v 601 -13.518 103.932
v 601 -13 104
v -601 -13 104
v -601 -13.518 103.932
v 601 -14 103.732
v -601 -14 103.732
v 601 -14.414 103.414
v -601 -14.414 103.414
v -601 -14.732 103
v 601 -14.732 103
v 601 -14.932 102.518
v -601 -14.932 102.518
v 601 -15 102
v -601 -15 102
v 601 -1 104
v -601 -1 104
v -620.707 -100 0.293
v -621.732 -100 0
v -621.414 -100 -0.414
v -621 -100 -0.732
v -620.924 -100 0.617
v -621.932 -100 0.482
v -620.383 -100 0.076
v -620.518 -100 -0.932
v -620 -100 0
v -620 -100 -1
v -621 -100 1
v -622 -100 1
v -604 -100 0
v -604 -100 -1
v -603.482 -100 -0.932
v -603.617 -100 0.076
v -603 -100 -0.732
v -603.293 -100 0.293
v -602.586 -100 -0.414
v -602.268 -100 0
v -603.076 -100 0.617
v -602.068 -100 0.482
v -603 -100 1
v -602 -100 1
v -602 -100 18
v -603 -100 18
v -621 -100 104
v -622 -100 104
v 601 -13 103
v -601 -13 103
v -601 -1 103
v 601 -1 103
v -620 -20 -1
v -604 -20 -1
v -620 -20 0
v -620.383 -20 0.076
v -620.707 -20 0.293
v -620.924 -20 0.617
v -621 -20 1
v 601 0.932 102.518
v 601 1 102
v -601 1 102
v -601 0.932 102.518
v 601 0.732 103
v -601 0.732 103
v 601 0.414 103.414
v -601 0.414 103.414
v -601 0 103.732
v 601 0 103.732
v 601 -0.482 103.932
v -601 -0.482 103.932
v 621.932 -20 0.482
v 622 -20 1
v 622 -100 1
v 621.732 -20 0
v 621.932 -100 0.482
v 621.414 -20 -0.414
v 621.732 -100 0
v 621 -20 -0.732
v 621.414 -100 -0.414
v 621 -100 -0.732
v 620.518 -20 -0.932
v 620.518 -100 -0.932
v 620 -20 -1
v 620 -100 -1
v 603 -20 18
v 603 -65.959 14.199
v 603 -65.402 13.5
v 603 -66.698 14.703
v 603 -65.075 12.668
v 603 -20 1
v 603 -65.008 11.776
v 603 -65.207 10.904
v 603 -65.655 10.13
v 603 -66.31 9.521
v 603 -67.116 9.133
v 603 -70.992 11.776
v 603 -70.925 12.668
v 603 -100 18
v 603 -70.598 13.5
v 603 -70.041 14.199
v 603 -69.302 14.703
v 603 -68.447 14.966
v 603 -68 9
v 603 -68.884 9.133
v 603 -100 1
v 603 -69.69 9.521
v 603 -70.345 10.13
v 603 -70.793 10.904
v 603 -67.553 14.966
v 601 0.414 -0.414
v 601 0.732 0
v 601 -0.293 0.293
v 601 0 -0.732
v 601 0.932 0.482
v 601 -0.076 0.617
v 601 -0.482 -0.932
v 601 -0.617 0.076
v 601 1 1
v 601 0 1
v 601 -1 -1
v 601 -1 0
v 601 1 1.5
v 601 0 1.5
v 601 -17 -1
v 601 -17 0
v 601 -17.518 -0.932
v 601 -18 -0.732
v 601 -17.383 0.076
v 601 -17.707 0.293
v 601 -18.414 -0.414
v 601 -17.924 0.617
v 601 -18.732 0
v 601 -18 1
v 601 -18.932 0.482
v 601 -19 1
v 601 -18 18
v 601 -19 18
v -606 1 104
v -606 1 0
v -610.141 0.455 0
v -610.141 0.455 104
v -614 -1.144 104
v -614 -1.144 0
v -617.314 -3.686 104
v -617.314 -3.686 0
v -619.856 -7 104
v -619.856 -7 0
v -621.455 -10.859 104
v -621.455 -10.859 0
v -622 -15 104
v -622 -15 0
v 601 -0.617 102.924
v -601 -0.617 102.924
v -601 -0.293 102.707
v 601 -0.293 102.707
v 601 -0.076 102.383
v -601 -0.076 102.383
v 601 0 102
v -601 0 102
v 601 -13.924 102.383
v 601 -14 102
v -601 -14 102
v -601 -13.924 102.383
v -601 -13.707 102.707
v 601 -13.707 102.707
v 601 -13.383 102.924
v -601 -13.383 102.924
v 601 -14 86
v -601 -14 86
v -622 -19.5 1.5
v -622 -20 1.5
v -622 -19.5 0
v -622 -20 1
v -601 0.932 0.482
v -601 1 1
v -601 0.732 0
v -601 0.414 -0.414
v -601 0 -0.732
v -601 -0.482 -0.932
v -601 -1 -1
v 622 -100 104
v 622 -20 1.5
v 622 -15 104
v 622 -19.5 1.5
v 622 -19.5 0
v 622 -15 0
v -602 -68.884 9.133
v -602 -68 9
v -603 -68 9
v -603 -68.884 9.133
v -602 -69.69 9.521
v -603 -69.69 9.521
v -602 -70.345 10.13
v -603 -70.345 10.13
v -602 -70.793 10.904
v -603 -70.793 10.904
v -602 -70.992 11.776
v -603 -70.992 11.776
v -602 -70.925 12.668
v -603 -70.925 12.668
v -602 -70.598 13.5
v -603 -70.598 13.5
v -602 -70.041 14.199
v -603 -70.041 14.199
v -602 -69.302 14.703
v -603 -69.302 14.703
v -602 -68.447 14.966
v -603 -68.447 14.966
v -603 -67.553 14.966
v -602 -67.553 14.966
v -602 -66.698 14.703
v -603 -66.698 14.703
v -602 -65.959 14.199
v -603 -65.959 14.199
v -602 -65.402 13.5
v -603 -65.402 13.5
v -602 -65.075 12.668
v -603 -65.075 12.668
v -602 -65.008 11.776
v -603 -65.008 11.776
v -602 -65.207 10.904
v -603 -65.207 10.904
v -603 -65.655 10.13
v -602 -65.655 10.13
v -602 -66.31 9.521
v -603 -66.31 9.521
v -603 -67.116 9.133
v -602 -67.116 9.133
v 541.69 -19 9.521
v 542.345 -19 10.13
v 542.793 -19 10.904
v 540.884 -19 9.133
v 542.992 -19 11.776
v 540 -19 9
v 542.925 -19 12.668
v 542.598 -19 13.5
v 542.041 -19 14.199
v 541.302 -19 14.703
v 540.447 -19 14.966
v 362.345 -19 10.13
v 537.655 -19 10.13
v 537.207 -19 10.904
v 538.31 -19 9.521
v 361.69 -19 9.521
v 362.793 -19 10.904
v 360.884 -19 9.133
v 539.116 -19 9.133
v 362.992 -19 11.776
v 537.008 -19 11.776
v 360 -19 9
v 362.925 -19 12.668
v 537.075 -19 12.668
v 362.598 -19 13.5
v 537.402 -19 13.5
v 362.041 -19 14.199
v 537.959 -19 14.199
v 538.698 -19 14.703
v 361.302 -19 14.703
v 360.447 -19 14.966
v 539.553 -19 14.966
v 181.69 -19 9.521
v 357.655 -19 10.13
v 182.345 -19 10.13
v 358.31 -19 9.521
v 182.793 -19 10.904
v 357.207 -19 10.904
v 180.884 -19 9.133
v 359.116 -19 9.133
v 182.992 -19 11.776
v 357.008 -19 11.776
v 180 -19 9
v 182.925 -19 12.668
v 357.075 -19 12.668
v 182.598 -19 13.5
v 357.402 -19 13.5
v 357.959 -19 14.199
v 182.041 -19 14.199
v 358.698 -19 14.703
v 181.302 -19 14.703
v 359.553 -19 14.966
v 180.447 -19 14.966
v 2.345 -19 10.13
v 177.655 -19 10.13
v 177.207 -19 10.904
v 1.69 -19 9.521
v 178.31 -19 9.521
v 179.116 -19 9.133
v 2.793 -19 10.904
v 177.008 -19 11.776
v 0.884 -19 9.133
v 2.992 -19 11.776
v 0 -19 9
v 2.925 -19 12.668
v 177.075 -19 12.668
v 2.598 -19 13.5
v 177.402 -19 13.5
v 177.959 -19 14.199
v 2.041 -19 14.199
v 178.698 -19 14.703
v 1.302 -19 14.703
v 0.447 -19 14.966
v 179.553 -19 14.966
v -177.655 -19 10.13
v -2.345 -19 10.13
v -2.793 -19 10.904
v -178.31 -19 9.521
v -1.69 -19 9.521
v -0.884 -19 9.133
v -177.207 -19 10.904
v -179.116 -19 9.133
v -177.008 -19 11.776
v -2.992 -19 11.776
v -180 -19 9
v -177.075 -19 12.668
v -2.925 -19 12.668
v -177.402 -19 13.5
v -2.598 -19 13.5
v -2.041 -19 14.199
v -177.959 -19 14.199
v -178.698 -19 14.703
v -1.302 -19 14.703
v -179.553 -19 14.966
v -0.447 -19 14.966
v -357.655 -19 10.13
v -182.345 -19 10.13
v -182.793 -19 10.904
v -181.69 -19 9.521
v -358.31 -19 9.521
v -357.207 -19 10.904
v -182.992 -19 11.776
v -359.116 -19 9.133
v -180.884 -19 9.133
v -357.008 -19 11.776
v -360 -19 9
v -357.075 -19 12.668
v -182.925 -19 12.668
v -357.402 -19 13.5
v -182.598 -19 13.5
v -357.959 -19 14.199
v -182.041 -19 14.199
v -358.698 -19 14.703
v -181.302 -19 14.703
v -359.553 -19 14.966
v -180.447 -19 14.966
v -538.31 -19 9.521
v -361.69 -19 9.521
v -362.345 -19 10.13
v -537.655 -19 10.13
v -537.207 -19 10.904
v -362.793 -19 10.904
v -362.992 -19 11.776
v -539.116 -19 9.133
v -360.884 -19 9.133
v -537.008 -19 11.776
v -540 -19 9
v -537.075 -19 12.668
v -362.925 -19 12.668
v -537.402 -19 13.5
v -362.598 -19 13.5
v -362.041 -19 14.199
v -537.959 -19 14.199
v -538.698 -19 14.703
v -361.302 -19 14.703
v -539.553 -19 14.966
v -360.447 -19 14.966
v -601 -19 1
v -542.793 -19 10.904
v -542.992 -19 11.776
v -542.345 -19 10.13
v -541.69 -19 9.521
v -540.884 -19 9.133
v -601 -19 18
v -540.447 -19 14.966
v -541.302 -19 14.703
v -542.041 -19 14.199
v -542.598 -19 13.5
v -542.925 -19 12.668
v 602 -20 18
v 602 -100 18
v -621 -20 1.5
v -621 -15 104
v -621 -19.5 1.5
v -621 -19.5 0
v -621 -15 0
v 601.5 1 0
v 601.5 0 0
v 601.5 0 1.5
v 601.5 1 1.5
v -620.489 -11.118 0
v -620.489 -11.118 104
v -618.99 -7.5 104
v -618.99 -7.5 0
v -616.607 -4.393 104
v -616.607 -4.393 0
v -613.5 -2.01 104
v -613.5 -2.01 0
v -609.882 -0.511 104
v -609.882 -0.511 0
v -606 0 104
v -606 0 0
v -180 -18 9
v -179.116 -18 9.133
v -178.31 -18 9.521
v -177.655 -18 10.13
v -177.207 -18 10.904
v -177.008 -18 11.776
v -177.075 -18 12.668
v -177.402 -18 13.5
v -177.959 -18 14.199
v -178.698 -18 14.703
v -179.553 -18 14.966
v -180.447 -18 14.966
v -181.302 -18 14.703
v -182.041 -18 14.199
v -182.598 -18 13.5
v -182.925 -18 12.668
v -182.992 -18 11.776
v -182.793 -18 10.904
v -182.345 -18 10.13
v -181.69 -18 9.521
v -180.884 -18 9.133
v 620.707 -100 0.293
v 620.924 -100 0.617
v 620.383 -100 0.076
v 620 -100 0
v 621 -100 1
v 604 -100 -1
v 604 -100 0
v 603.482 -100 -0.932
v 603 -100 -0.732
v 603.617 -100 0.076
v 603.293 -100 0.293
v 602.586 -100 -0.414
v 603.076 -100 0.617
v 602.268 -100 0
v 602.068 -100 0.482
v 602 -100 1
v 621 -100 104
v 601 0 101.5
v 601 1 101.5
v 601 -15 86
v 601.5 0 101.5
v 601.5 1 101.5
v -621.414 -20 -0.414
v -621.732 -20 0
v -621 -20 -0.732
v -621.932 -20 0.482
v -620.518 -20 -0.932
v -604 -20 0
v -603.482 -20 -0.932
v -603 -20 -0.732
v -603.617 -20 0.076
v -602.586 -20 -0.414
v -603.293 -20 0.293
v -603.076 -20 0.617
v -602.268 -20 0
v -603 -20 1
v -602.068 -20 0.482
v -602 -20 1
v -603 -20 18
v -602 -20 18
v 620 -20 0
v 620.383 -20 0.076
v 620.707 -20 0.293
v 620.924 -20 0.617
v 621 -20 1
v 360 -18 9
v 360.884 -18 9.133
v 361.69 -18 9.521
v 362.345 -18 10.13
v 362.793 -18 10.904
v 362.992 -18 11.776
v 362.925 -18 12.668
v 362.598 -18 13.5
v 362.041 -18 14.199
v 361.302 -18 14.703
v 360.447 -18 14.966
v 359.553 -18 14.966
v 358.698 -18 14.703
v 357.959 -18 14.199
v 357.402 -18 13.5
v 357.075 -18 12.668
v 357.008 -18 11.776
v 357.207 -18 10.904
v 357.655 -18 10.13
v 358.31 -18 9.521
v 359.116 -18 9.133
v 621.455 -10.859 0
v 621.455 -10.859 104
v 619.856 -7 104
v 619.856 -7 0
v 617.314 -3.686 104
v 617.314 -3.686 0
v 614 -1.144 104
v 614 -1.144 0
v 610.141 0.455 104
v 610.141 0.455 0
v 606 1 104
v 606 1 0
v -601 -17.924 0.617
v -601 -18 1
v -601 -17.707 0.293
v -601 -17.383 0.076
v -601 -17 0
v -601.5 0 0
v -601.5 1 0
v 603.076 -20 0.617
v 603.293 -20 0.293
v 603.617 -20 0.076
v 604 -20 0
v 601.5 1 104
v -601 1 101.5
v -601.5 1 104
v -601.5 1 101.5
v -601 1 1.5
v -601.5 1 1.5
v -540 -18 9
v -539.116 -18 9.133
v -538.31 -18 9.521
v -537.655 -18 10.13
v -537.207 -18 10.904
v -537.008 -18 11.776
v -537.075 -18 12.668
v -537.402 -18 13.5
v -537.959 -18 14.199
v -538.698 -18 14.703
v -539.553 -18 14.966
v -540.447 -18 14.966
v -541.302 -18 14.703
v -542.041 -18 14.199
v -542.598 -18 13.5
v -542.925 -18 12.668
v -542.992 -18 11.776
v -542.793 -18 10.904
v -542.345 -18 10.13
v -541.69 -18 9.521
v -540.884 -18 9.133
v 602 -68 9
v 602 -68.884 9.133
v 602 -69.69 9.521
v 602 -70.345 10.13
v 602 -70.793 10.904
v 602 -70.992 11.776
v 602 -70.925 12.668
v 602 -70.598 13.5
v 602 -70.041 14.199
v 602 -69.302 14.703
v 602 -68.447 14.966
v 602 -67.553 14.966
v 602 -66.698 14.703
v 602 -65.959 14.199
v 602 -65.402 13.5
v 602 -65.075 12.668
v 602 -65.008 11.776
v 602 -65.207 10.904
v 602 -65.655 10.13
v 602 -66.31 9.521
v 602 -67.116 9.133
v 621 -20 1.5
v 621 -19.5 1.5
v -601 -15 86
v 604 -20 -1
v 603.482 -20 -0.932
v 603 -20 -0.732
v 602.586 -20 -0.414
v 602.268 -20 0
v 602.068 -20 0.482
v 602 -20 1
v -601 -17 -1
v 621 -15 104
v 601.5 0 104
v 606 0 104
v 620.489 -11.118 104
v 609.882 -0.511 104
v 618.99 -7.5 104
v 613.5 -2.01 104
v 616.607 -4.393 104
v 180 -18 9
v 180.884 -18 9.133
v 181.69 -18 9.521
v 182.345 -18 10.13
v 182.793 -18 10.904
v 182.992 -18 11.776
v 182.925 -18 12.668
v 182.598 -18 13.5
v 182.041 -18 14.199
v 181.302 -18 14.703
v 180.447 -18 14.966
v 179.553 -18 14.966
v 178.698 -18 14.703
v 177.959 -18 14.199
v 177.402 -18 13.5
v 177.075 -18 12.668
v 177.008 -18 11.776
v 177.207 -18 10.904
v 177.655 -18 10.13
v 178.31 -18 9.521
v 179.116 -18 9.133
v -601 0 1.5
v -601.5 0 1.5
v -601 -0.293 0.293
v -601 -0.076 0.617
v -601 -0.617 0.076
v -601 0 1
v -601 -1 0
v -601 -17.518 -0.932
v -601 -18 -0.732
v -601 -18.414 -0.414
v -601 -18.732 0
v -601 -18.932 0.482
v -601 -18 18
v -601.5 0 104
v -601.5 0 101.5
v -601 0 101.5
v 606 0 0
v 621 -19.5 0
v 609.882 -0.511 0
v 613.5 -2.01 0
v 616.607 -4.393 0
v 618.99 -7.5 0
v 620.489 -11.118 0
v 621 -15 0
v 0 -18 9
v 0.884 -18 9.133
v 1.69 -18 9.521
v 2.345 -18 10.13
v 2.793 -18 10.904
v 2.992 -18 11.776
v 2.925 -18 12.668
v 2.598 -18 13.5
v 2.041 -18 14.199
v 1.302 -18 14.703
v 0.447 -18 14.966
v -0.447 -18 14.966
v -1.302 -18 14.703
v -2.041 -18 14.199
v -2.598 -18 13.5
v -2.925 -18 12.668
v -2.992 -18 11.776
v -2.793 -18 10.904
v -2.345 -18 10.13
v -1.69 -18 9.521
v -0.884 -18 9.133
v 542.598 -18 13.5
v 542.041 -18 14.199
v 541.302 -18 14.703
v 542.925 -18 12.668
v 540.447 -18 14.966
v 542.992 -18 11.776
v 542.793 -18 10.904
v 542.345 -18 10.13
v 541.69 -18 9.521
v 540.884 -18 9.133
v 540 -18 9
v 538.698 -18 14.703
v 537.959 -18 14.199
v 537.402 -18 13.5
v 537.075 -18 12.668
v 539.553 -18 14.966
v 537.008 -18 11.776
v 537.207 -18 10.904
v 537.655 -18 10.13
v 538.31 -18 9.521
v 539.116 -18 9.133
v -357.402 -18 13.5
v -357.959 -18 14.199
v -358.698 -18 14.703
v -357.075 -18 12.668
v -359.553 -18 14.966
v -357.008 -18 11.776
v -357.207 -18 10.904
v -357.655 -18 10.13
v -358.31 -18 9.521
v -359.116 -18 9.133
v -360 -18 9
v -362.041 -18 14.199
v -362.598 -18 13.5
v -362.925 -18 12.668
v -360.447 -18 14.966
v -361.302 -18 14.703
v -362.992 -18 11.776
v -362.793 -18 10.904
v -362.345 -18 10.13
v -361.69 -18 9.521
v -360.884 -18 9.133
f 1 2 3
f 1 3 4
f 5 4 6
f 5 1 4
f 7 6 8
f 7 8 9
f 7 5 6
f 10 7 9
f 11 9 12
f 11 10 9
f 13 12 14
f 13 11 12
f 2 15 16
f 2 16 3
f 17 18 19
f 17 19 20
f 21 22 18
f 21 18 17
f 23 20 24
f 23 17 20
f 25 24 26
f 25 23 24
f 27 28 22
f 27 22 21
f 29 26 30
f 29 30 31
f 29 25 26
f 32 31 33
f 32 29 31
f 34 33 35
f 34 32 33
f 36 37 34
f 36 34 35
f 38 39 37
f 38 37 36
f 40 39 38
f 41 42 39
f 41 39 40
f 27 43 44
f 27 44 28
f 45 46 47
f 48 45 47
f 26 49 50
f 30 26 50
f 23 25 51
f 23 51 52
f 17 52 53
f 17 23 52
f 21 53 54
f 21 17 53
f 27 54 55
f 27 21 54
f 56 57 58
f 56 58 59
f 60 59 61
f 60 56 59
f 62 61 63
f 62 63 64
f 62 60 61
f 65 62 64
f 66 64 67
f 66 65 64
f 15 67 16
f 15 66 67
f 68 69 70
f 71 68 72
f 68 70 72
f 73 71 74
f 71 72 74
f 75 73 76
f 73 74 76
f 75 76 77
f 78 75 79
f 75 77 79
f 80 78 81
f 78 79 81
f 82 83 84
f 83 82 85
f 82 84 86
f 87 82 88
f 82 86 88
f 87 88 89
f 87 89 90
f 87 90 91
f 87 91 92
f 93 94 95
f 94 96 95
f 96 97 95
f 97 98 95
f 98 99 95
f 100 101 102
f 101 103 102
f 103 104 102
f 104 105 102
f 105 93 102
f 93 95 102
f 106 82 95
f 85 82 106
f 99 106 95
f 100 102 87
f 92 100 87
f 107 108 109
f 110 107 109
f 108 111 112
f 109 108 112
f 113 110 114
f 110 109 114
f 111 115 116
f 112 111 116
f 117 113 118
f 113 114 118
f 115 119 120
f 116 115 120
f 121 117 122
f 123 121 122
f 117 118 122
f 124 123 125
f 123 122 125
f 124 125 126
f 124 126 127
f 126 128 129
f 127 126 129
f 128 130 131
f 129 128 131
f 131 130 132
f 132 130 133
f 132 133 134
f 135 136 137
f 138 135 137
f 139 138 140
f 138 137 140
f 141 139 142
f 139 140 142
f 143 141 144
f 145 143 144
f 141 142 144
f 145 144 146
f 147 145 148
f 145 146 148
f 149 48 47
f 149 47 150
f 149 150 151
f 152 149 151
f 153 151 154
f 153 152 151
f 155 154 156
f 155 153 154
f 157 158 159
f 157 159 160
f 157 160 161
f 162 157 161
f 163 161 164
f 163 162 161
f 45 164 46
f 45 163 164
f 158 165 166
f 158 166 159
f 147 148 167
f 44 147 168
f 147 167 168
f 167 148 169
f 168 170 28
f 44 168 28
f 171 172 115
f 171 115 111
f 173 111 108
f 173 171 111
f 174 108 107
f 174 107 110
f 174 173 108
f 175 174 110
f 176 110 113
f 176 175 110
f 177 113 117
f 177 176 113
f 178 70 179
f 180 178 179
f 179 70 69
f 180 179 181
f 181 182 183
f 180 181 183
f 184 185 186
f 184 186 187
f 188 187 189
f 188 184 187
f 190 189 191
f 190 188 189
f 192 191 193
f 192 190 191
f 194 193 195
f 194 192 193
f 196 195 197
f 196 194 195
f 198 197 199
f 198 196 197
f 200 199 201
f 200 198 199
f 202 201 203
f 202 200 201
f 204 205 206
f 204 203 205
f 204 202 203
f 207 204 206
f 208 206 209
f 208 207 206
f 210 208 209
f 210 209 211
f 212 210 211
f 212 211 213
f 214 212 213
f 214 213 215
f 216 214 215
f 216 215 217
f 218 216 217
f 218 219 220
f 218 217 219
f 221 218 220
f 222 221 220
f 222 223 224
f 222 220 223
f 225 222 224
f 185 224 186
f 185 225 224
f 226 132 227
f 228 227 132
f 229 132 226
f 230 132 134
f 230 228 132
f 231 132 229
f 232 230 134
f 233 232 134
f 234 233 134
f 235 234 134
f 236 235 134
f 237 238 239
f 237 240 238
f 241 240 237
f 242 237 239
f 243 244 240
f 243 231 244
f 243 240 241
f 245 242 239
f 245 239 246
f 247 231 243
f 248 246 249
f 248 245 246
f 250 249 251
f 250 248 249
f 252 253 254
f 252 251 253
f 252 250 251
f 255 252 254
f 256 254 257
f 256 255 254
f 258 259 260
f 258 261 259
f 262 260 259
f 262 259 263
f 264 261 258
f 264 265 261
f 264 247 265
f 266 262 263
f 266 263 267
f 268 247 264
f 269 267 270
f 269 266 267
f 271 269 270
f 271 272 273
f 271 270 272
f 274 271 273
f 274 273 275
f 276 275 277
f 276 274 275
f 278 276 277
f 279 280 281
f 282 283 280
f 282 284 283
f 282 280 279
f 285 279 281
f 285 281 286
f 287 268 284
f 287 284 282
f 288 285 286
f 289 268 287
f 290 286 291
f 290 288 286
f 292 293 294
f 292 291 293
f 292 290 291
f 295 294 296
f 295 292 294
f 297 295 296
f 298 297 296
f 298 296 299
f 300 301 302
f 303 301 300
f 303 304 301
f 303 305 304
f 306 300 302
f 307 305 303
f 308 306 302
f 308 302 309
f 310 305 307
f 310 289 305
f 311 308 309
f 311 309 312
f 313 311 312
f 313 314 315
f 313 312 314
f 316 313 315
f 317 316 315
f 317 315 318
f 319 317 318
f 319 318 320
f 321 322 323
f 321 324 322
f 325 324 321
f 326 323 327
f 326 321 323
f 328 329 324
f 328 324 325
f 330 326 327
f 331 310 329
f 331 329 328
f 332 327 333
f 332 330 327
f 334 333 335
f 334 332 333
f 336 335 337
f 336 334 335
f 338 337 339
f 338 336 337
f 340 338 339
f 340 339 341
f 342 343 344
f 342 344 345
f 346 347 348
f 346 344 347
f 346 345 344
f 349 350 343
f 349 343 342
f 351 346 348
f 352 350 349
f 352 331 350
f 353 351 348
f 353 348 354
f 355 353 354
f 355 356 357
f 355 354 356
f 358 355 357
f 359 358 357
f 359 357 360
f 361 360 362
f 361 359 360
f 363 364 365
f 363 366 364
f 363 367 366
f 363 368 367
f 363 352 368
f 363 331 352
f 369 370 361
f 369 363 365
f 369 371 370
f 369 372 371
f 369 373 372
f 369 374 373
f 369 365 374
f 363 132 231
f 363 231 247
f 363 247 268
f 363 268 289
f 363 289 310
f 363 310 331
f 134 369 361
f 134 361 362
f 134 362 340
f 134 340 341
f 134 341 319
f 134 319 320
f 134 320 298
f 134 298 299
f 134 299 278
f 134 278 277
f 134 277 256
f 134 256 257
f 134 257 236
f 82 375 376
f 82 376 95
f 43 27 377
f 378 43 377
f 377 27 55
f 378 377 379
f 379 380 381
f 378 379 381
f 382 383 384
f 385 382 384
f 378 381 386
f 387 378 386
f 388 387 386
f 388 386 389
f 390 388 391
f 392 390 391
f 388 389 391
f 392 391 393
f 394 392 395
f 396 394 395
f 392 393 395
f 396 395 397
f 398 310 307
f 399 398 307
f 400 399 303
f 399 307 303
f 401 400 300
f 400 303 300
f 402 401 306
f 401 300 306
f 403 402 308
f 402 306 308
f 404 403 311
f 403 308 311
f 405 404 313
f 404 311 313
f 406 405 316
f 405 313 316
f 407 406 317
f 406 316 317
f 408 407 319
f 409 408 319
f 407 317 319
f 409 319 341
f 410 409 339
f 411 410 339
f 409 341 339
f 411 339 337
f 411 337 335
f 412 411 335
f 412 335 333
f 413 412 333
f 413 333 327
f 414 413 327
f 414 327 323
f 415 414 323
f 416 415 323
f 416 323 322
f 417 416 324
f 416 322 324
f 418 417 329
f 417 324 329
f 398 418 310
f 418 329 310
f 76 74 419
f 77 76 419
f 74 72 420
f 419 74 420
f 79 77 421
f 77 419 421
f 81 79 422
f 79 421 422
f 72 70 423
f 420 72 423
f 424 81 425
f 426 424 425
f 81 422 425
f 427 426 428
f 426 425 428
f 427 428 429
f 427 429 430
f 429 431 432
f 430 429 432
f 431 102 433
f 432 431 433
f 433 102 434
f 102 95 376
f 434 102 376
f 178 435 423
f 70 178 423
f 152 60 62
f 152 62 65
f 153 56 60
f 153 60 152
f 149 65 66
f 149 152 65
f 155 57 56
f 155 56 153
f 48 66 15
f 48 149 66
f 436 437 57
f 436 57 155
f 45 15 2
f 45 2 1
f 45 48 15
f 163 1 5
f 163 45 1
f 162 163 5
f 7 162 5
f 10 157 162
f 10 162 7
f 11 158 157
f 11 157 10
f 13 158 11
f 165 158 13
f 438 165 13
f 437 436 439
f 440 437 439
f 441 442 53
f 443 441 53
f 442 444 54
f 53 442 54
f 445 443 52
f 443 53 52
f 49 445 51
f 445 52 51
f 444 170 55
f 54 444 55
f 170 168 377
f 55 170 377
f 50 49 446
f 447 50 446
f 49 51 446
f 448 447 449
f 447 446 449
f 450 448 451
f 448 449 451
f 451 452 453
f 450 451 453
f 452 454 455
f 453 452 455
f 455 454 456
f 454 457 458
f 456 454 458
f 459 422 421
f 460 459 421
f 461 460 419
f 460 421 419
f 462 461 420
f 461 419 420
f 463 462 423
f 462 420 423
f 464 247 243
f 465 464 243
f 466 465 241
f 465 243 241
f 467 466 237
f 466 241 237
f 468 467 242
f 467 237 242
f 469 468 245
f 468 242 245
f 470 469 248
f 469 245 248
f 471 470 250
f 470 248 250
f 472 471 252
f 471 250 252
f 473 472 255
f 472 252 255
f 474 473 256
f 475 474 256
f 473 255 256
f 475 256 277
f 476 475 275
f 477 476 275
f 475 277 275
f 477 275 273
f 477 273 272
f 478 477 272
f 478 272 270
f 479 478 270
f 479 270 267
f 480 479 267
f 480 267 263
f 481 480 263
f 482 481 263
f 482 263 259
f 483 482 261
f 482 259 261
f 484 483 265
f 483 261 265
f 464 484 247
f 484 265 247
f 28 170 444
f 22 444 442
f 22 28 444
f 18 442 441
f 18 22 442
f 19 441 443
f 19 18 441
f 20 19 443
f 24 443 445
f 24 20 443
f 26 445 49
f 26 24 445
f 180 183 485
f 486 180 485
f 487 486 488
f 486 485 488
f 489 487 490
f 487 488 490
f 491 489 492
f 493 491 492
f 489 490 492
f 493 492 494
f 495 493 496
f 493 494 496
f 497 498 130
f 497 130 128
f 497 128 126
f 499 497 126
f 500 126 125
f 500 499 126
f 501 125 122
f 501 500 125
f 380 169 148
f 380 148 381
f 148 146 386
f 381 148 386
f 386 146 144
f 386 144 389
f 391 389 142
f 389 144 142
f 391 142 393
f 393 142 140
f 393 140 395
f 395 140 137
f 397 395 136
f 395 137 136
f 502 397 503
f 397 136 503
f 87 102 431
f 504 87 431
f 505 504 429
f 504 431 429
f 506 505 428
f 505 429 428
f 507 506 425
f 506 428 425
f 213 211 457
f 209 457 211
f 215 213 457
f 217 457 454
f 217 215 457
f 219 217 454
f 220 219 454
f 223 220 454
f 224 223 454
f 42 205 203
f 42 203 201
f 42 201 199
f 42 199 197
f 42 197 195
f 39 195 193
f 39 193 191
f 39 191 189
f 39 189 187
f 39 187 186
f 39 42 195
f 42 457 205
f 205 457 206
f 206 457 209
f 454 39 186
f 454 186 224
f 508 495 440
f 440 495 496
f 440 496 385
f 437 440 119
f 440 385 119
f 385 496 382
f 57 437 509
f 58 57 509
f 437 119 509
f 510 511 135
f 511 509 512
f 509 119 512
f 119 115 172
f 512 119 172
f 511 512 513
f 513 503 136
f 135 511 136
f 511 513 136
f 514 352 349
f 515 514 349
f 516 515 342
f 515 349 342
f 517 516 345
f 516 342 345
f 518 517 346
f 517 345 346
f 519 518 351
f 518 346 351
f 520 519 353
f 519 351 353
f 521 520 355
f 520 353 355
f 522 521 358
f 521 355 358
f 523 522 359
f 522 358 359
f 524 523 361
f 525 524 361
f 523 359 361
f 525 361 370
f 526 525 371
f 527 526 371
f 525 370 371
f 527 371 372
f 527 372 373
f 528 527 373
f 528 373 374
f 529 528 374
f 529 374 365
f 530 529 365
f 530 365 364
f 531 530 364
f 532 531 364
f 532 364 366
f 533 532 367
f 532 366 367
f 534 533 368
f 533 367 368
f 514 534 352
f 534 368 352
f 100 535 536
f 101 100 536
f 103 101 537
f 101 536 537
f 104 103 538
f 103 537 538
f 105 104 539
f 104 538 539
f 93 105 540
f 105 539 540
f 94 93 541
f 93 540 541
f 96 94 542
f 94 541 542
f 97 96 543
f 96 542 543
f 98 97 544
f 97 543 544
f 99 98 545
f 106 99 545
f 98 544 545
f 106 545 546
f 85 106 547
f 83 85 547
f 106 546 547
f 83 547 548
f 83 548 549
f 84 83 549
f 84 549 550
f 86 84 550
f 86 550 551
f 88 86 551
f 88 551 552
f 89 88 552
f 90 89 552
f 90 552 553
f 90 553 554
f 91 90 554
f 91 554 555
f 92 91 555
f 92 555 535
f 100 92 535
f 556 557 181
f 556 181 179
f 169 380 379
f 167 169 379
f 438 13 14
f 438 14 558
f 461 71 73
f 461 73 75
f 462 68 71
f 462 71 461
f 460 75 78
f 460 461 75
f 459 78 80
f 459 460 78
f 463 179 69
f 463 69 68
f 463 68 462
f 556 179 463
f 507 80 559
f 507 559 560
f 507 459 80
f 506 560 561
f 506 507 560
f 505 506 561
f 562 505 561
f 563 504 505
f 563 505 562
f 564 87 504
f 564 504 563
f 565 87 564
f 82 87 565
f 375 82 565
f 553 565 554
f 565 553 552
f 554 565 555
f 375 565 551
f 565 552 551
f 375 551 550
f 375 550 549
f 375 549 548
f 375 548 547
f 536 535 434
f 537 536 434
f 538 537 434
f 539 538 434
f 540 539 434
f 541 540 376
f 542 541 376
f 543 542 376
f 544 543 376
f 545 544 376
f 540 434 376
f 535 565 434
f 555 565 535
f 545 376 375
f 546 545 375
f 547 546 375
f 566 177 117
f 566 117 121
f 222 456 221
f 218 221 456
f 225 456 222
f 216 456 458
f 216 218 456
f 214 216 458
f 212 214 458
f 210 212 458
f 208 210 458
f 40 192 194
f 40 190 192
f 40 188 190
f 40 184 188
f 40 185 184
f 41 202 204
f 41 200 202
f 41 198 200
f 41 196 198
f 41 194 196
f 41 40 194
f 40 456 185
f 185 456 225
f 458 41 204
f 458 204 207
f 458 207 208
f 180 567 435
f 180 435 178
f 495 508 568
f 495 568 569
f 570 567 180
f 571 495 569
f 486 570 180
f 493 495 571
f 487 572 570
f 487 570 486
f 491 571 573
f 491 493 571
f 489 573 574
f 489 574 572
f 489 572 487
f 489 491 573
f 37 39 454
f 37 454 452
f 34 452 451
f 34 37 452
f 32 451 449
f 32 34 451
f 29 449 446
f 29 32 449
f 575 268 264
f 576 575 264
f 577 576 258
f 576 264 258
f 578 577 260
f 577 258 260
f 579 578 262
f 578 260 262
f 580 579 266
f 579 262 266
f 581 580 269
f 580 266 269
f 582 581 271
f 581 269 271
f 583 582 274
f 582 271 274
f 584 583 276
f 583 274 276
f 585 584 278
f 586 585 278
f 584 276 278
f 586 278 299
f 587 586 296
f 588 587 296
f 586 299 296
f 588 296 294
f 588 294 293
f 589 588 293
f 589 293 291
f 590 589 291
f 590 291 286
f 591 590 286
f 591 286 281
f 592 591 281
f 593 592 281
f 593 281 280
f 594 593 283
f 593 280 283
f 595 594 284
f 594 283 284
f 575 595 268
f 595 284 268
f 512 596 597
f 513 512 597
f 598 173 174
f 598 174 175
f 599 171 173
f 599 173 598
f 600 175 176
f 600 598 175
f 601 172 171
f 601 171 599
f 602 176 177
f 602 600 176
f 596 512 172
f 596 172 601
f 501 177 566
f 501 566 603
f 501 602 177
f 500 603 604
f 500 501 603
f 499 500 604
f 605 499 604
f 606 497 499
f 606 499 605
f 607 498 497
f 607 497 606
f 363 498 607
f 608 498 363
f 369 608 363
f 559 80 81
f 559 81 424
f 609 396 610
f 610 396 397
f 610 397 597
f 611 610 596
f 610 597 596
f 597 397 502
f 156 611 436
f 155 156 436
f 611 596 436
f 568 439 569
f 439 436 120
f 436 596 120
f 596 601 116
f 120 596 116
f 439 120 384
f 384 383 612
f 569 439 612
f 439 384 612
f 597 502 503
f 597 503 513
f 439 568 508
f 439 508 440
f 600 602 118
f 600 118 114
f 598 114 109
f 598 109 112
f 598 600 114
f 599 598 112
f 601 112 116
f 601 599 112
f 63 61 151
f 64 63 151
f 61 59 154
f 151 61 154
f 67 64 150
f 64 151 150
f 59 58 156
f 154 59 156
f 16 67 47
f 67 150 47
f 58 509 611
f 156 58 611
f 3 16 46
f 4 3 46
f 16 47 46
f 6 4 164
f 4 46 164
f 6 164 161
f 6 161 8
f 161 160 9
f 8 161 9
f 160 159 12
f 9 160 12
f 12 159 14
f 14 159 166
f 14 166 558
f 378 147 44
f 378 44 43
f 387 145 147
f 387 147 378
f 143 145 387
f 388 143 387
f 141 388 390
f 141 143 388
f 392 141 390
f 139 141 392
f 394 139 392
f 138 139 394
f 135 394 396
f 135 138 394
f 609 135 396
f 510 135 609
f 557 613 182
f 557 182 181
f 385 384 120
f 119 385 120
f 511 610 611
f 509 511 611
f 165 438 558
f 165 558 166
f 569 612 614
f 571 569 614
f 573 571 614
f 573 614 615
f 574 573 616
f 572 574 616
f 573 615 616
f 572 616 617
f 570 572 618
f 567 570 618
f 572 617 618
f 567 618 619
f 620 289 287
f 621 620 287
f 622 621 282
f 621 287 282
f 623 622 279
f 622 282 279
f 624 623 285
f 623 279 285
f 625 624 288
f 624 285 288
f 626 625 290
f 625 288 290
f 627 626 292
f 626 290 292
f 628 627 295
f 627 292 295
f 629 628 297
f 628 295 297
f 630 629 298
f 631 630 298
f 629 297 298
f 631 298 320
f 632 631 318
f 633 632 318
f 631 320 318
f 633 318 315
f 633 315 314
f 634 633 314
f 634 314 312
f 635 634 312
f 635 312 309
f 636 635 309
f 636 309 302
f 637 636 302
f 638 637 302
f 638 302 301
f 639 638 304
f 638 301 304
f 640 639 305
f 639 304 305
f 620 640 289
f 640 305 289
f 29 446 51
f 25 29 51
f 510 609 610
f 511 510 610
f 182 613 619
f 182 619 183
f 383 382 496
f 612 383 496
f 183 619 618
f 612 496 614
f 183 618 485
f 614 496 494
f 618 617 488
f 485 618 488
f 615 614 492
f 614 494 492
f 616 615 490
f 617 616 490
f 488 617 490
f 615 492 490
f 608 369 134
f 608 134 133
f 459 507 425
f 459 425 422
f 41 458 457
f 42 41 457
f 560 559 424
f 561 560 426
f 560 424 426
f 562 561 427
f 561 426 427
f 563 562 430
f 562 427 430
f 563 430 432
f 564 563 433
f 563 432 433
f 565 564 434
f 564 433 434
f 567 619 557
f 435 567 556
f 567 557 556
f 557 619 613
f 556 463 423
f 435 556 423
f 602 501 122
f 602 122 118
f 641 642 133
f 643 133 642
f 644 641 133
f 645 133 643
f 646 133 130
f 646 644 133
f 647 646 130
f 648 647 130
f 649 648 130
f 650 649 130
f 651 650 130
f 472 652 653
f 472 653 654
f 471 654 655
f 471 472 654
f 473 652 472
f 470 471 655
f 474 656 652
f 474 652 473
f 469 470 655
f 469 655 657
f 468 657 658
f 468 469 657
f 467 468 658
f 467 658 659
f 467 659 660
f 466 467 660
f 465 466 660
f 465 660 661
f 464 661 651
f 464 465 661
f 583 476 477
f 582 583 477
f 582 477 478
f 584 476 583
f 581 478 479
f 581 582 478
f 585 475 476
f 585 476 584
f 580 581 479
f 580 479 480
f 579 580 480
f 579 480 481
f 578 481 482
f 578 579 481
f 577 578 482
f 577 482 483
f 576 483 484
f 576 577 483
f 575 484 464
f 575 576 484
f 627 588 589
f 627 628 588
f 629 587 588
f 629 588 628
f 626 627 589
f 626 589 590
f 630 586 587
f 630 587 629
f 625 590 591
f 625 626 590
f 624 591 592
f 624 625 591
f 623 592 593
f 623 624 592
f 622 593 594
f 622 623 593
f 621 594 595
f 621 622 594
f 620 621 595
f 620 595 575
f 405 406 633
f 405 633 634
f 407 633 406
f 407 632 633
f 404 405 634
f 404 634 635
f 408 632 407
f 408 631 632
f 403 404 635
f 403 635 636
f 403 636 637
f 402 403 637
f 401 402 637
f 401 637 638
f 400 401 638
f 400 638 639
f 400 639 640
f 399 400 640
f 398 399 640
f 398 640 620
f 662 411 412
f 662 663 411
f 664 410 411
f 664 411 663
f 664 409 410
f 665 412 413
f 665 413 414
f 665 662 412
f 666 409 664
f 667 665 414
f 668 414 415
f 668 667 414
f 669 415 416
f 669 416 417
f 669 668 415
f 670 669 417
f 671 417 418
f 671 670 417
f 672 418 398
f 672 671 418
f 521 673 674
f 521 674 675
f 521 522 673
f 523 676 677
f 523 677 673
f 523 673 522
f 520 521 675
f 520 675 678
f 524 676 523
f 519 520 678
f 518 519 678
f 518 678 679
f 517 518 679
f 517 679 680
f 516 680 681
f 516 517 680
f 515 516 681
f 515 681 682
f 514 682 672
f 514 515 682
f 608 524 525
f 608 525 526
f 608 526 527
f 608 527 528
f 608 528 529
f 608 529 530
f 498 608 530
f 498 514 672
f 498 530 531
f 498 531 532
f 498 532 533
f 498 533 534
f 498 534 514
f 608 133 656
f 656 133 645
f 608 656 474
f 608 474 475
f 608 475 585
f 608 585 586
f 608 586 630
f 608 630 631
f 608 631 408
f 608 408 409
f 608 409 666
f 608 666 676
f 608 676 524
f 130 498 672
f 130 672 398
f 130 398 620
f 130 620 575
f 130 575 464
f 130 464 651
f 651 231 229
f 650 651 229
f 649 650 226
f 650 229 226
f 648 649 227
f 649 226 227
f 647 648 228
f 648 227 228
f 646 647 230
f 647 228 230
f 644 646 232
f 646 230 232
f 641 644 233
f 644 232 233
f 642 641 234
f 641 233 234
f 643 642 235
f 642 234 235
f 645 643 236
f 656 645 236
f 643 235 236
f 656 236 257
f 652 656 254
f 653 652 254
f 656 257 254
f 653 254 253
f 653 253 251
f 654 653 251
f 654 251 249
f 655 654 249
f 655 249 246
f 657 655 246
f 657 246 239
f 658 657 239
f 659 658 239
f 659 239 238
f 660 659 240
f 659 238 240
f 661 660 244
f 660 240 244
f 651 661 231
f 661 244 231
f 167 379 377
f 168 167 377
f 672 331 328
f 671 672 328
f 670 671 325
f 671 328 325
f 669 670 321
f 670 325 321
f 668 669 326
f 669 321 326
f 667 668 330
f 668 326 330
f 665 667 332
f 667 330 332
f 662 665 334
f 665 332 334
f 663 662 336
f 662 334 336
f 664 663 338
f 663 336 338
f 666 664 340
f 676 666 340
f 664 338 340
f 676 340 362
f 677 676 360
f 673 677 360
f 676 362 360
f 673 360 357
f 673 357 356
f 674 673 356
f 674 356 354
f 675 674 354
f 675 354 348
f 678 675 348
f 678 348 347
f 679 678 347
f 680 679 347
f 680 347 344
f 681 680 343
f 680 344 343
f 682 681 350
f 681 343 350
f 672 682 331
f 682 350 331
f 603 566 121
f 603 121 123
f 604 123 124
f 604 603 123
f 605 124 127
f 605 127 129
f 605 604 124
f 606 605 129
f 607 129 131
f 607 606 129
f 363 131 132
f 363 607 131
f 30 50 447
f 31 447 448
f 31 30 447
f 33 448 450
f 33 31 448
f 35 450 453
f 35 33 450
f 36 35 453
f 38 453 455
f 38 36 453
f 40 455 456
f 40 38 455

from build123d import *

# Parameters (mm, degrees)
BASE_FLANGE1_DEPTH             = 104
EDGE_FLANGE1_STRIP_W           = 6
EDGE_FLANGE1_STRIP_H           = 1
EDGE_FLANGE1_STRIP_CUT_DEPTH   = 1202
EDGE_FLANGE1_RELIEF_W          = 6.5
EDGE_FLANGE1_RELIEF_H          = 0.5
EDGE_FLANGE1_RELIEF_CUT_DEPTH  = 1
EDGE_FLANGE1_DEPTH             = 1202
EDGE_FLANGE2_STRIP_W           = 6
EDGE_FLANGE2_STRIP_H           = 1
EDGE_FLANGE2_STRIP_CUT_DEPTH   = 1202
EDGE_FLANGE2_DEPTH             = 1202
EDGE_FLANGE3_STRIP_W           = 6
EDGE_FLANGE3_STRIP_H           = 1
EDGE_FLANGE3_STRIP_CUT_DEPTH   = 80
EDGE_FLANGE3_RELIEF_W          = 6.5
EDGE_FLANGE3_RELIEF_H          = 0.5
EDGE_FLANGE3_RELIEF_CUT_DEPTH  = 1
EDGE_FLANGE3_DEPTH             = 80
EDGE_FLANGE4_STRIP_W           = 6
EDGE_FLANGE4_STRIP_H           = 1
EDGE_FLANGE4_STRIP_CUT_DEPTH   = 80
EDGE_FLANGE4_DEPTH             = 80
EDGE_FLANGE5_STRIP_W           = 6
EDGE_FLANGE5_STRIP_H           = 1
EDGE_FLANGE5_STRIP_CUT_DEPTH   = 1202
EDGE_FLANGE5_RELIEF_W          = 6.5
EDGE_FLANGE5_RELIEF_H          = 0.5
EDGE_FLANGE5_RELIEF_CUT_DEPTH  = 1
EDGE_FLANGE5_DEPTH             = 1202
SKETCH22_R                     = 3
CUT_EXTRUDE1_DEPTH             = 1
SKETCH23_R                     = 3
CUT_EXTRUDE2_DEPTH             = 3
CUT_EXTRUDE2_DIRECTION_2_REACH = 1234.474
EDGE_FLANGE6_STRIP_W           = 6
EDGE_FLANGE6_STRIP_H           = 1
EDGE_FLANGE6_STRIP_CUT_DEPTH   = 1202
EDGE_FLANGE6_DEPTH             = 1202


# Sheet-metal steps are written as plain solids
with BuildPart() as part:
    # Sketch1 → Base-Flange1 (new body)
    with BuildSketch(Plane.XY):
        with BuildLine():
            Line((-621, -100), (-621, -15))
            ThreePointArc((-621, -15), (-616.606601718, -4.393398282), (-606, 0))
            Line((-606, 0), (606, 0))
            ThreePointArc((606, 0), (616.606601718, -4.393398282), (621, -15))
            Line((621, -15), (621, -100))
            Line((621, -100), (622, -100))
            Line((622, -100), (622, -15))
            ThreePointArc((622, -15), (617.313708499, -3.686291501), (606, 1))
            Line((606, 1), (-606, 1))
            ThreePointArc((-606, 1), (-617.313708499, -3.686291501), (-622, -15))
            Line((-622, -15), (-622, -100))
            Line((-622, -100), (-621, -100))
        make_face()
    extrude(amount=BASE_FLANGE1_DEPTH)

    # Edge-Flange1 strip (across the edge) → Edge-Flange1 strip cut (cut)
    with BuildSketch(Plane(origin=(-601, 0, 0), x_dir=(0, 0, 1), z_dir=(1, 0, 0))):
        with Locations((-2, -0.5)):
            Rectangle(EDGE_FLANGE1_STRIP_W, EDGE_FLANGE1_STRIP_H)
    extrude(amount=EDGE_FLANGE1_STRIP_CUT_DEPTH, mode=Mode.SUBTRACT)

    # Edge-Flange1 relief (on the sheet) → Edge-Flange1 relief cut (cut)
    with BuildSketch(Plane(origin=(-601, 0, 1), x_dir=(0, 0, 1), z_dir=(0, -1, 0))):
        with Locations((-2.75, 0.25)):
            Rectangle(EDGE_FLANGE1_RELIEF_W, EDGE_FLANGE1_RELIEF_H)
        with Locations((-2.75, -1202.25)):
            Rectangle(EDGE_FLANGE1_RELIEF_W, EDGE_FLANGE1_RELIEF_H)
    extrude(amount=-EDGE_FLANGE1_RELIEF_CUT_DEPTH, mode=Mode.SUBTRACT)

    # Edge-Flange1 section (across the edge) → Edge-Flange1 (add)
    with BuildSketch(Plane(origin=(-601, 0, 0), x_dir=(0, 0, 1), z_dir=(1, 0, 0))):
        with BuildLine():
            Line((-1, 1), (-1, 19))
            Line((-1, 19), (0, 19))
            Line((0, 19), (0, 1))
            ThreePointArc((0, 1), (0.292893219, 0.292893219), (1, 0))
            Line((1, 0), (1, -1))
            ThreePointArc((1, -1), (-0.414213562, -0.414213562), (-1, 1))
        make_face()
    extrude(amount=EDGE_FLANGE1_DEPTH)

    # Edge-Flange2 strip (across the edge) → Edge-Flange2 strip cut (cut)
    with BuildSketch(Plane(origin=(-601, -19, 0), x_dir=(0, 1, 0), z_dir=(1, 0, 0))):
        with Locations((-1, -0.5)):
            Rectangle(EDGE_FLANGE2_STRIP_W, EDGE_FLANGE2_STRIP_H)
    extrude(amount=EDGE_FLANGE2_STRIP_CUT_DEPTH, mode=Mode.SUBTRACT)

    # Edge-Flange2 section (across the edge) → Edge-Flange2 (add)
    with BuildSketch(Plane(origin=(-601, -19, 0), x_dir=(0, 1, 0), z_dir=(1, 0, 0))):
        with BuildLine():
            Line((0, 1), (0, 18))
            Line((0, 18), (1, 18))
            Line((1, 18), (1, 1))
            ThreePointArc((1, 1), (1.292893219, 0.292893219), (2, 0))
            Line((2, 0), (2, -1))
            ThreePointArc((2, -1), (0.585786438, -0.414213562), (0, 1))
        make_face()
    extrude(amount=EDGE_FLANGE2_DEPTH)

    # Edge-Flange3 strip (across the edge) → Edge-Flange3 strip cut (cut)
    with BuildSketch(Plane(origin=(-621, -100, 0), x_dir=(0, 0, 1), z_dir=(0, 1, 0))):
        with Locations((-2, -0.5)):
            Rectangle(EDGE_FLANGE3_STRIP_W, EDGE_FLANGE3_STRIP_H)
    edge_flange3_strip_cut = extrude(amount=EDGE_FLANGE3_STRIP_CUT_DEPTH, mode=Mode.SUBTRACT)

    # Edge-Flange3 relief (on the sheet) → Edge-Flange3 relief cut (cut)
    with BuildSketch(Plane(origin=(-621, -100, 1), x_dir=(0, 0, 1), z_dir=(1, 0, 0))):
        with Locations((-2.75, -80.25)):
            Rectangle(EDGE_FLANGE3_RELIEF_W, EDGE_FLANGE3_RELIEF_H)
    edge_flange3_relief_cut = extrude(amount=-EDGE_FLANGE3_RELIEF_CUT_DEPTH, mode=Mode.SUBTRACT)

    # Edge-Flange3 section (across the edge) → Edge-Flange3 (add)
    with BuildSketch(Plane(origin=(-621, -100, 0), x_dir=(0, 0, 1), z_dir=(0, 1, 0))):
        with BuildLine():
            Line((-1, 1), (-1, 19))
            Line((-1, 19), (0, 19))
            Line((0, 19), (0, 1))
            ThreePointArc((0, 1), (0.292893219, 0.292893219), (1, 0))
            Line((1, 0), (1, -1))
            ThreePointArc((1, -1), (-0.414213562, -0.414213562), (-1, 1))
        make_face()
    edge_flange3 = extrude(amount=EDGE_FLANGE3_DEPTH)

    # Edge-Flange4 strip (across the edge) → Edge-Flange4 strip cut (cut)
    with BuildSketch(Plane(origin=(-602, -100, 0), x_dir=(-1, 0, 0), z_dir=(0, 1, 0))):
        with Locations((-1, -0.5)):
            Rectangle(EDGE_FLANGE4_STRIP_W, EDGE_FLANGE4_STRIP_H)
    edge_flange4_strip_cut = extrude(amount=EDGE_FLANGE4_STRIP_CUT_DEPTH, mode=Mode.SUBTRACT)

    # Edge-Flange4 section (across the edge) → Edge-Flange4 (add)
    with BuildSketch(Plane(origin=(-602, -100, 0), x_dir=(-1, 0, 0), z_dir=(0, 1, 0))):
        with BuildLine():
            Line((0, 1), (0, 18))
            Line((0, 18), (1, 18))
            Line((1, 18), (1, 1))
            ThreePointArc((1, 1), (1.292893219, 0.292893219), (2, 0))
            Line((2, 0), (2, -1))
            ThreePointArc((2, -1), (0.585786438, -0.414213562), (0, 1))
        make_face()
    edge_flange4 = extrude(amount=EDGE_FLANGE4_DEPTH)

    # Mirror1: Edge-Flange3 strip cut, Edge-Flange3 relief cut, Edge-Flange3, Edge-Flange4 strip cut, Edge-Flange4 across plane
    add(edge_flange3_strip_cut.mirror(Plane(origin=(0, 0, 0), x_dir=(0, 0, 1), z_dir=(1, 0, 0))), mode=Mode.SUBTRACT)
    add(edge_flange3_relief_cut.mirror(Plane(origin=(0, 0, 0), x_dir=(0, 0, 1), z_dir=(1, 0, 0))), mode=Mode.SUBTRACT)
    add(edge_flange3.mirror(Plane(origin=(0, 0, 0), x_dir=(0, 0, 1), z_dir=(1, 0, 0))))
    add(edge_flange4_strip_cut.mirror(Plane(origin=(0, 0, 0), x_dir=(0, 0, 1), z_dir=(1, 0, 0))), mode=Mode.SUBTRACT)
    add(edge_flange4.mirror(Plane(origin=(0, 0, 0), x_dir=(0, 0, 1), z_dir=(1, 0, 0))))

    # Edge-Flange5 strip (across the edge) → Edge-Flange5 strip cut (cut)
    with BuildSketch(Plane(origin=(601, 0, 104), x_dir=(0, 0, -1), z_dir=(-1, 0, 0))):
        with Locations((-1, -0.5)):
            Rectangle(EDGE_FLANGE5_STRIP_W, EDGE_FLANGE5_STRIP_H)
    extrude(amount=EDGE_FLANGE5_STRIP_CUT_DEPTH, mode=Mode.SUBTRACT)

    # Edge-Flange5 relief (on the sheet) → Edge-Flange5 relief cut (cut)
    with BuildSketch(Plane(origin=(601, 0, 102), x_dir=(0, 0, -1), z_dir=(0, -1, 0))):
        with Locations((-2.75, 0.25)):
            Rectangle(EDGE_FLANGE5_RELIEF_W, EDGE_FLANGE5_RELIEF_H)
        with Locations((-2.75, -1202.25)):
            Rectangle(EDGE_FLANGE5_RELIEF_W, EDGE_FLANGE5_RELIEF_H)
    extrude(amount=-EDGE_FLANGE5_RELIEF_CUT_DEPTH, mode=Mode.SUBTRACT)

    # Edge-Flange5 section (across the edge) → Edge-Flange5 (add)
    with BuildSketch(Plane(origin=(601, 0, 104), x_dir=(0, 0, -1), z_dir=(-1, 0, 0))):
        with BuildLine():
            Line((0, 1), (0, 15))
            Line((0, 15), (1, 15))
            Line((1, 15), (1, 1))
            ThreePointArc((1, 1), (1.292893219, 0.292893219), (2, 0))
            Line((2, 0), (2, -1))
            ThreePointArc((2, -1), (0.585786438, -0.414213562), (0, 1))
        make_face()
    extrude(amount=EDGE_FLANGE5_DEPTH)

    # Sketch22 → Cut-Extrude1 (cut)
    with BuildSketch(Plane.XZ.offset(19)):
        with Locations(Location((-540, 12, 0), (0, 0, 270))):
            Circle(SKETCH22_R)
        with Locations(Location((-360, 12, 0), (0, 0, 270))):
            Circle(SKETCH22_R)
        with Locations(Location((-180, 12, 0), (0, 0, 270))):
            Circle(SKETCH22_R)
        with Locations(Location((0, 12, 0), (0, 0, 270))):
            Circle(SKETCH22_R)
        with Locations(Location((180, 12, 0), (0, 0, 270))):
            Circle(SKETCH22_R)
        with Locations(Location((360, 12, 0), (0, 0, 270))):
            Circle(SKETCH22_R)
        with Locations(Location((540, 12, 0), (0, 0, 270))):
            Circle(SKETCH22_R)
    extrude(amount=-CUT_EXTRUDE1_DEPTH, mode=Mode.SUBTRACT)

    # Sketch23 → Cut-Extrude2 (cut)
    with BuildSketch(Plane.ZY.offset(-602)):
        with Locations(Location((12, -68, 0), (0, 0, 180))):
            Circle(SKETCH23_R)
    extrude(amount=-CUT_EXTRUDE2_DEPTH, mode=Mode.SUBTRACT)

    # Cut-Extrude2 direction 2: up to this face of the body (flat: up to its plane)
    cut_extrude2_direction_2_end = Plane(part.part.faces().sort_by_distance((-603, -60, 9.5))[0])
    # Sketch23 → Cut-Extrude2 direction 2 (cut, up to the picked face)
    with BuildSketch(Plane.ZY.offset(-602), mode=Mode.PRIVATE) as cut_extrude2_direction_2_sk1:
        with Locations(Location((12, -68, 0), (0, 0, 180))):
            Circle(SKETCH23_R)
    cut_extrude2_direction_2_tool1 = split(extrude(cut_extrude2_direction_2_sk1.sketch, amount=CUT_EXTRUDE2_DIRECTION_2_REACH, mode=Mode.PRIVATE), bisect_by=cut_extrude2_direction_2_end, keep=Keep.BOTH, mode=Mode.PRIVATE)
    add(cut_extrude2_direction_2_tool1.solids().sort_by(Axis((602, -68, 12), (-1, 0, 0)))[0], mode=Mode.SUBTRACT)

    # Edge-Flange6 strip (across the edge) → Edge-Flange6 strip cut (cut)
    with BuildSketch(Plane(origin=(601, -15, 103), x_dir=(0, 1, 0), z_dir=(-1, 0, 0))):
        with Locations((-1, -0.5)):
            Rectangle(EDGE_FLANGE6_STRIP_W, EDGE_FLANGE6_STRIP_H)
    extrude(amount=EDGE_FLANGE6_STRIP_CUT_DEPTH, mode=Mode.SUBTRACT)

    # Edge-Flange6 section (across the edge) → Edge-Flange6 (add)
    with BuildSketch(Plane(origin=(601, -15, 103), x_dir=(0, 1, 0), z_dir=(-1, 0, 0))):
        with BuildLine():
            Line((0, 1), (0, 17))
            Line((0, 17), (1, 17))
            Line((1, 17), (1, 1))
            ThreePointArc((1, 1), (1.292893219, 0.292893219), (2, 0))
            Line((2, 0), (2, -1))
            ThreePointArc((2, -1), (0.585786438, -0.414213562), (0, 1))
        make_face()
    extrude(amount=EDGE_FLANGE6_DEPTH)


solid = part.part
